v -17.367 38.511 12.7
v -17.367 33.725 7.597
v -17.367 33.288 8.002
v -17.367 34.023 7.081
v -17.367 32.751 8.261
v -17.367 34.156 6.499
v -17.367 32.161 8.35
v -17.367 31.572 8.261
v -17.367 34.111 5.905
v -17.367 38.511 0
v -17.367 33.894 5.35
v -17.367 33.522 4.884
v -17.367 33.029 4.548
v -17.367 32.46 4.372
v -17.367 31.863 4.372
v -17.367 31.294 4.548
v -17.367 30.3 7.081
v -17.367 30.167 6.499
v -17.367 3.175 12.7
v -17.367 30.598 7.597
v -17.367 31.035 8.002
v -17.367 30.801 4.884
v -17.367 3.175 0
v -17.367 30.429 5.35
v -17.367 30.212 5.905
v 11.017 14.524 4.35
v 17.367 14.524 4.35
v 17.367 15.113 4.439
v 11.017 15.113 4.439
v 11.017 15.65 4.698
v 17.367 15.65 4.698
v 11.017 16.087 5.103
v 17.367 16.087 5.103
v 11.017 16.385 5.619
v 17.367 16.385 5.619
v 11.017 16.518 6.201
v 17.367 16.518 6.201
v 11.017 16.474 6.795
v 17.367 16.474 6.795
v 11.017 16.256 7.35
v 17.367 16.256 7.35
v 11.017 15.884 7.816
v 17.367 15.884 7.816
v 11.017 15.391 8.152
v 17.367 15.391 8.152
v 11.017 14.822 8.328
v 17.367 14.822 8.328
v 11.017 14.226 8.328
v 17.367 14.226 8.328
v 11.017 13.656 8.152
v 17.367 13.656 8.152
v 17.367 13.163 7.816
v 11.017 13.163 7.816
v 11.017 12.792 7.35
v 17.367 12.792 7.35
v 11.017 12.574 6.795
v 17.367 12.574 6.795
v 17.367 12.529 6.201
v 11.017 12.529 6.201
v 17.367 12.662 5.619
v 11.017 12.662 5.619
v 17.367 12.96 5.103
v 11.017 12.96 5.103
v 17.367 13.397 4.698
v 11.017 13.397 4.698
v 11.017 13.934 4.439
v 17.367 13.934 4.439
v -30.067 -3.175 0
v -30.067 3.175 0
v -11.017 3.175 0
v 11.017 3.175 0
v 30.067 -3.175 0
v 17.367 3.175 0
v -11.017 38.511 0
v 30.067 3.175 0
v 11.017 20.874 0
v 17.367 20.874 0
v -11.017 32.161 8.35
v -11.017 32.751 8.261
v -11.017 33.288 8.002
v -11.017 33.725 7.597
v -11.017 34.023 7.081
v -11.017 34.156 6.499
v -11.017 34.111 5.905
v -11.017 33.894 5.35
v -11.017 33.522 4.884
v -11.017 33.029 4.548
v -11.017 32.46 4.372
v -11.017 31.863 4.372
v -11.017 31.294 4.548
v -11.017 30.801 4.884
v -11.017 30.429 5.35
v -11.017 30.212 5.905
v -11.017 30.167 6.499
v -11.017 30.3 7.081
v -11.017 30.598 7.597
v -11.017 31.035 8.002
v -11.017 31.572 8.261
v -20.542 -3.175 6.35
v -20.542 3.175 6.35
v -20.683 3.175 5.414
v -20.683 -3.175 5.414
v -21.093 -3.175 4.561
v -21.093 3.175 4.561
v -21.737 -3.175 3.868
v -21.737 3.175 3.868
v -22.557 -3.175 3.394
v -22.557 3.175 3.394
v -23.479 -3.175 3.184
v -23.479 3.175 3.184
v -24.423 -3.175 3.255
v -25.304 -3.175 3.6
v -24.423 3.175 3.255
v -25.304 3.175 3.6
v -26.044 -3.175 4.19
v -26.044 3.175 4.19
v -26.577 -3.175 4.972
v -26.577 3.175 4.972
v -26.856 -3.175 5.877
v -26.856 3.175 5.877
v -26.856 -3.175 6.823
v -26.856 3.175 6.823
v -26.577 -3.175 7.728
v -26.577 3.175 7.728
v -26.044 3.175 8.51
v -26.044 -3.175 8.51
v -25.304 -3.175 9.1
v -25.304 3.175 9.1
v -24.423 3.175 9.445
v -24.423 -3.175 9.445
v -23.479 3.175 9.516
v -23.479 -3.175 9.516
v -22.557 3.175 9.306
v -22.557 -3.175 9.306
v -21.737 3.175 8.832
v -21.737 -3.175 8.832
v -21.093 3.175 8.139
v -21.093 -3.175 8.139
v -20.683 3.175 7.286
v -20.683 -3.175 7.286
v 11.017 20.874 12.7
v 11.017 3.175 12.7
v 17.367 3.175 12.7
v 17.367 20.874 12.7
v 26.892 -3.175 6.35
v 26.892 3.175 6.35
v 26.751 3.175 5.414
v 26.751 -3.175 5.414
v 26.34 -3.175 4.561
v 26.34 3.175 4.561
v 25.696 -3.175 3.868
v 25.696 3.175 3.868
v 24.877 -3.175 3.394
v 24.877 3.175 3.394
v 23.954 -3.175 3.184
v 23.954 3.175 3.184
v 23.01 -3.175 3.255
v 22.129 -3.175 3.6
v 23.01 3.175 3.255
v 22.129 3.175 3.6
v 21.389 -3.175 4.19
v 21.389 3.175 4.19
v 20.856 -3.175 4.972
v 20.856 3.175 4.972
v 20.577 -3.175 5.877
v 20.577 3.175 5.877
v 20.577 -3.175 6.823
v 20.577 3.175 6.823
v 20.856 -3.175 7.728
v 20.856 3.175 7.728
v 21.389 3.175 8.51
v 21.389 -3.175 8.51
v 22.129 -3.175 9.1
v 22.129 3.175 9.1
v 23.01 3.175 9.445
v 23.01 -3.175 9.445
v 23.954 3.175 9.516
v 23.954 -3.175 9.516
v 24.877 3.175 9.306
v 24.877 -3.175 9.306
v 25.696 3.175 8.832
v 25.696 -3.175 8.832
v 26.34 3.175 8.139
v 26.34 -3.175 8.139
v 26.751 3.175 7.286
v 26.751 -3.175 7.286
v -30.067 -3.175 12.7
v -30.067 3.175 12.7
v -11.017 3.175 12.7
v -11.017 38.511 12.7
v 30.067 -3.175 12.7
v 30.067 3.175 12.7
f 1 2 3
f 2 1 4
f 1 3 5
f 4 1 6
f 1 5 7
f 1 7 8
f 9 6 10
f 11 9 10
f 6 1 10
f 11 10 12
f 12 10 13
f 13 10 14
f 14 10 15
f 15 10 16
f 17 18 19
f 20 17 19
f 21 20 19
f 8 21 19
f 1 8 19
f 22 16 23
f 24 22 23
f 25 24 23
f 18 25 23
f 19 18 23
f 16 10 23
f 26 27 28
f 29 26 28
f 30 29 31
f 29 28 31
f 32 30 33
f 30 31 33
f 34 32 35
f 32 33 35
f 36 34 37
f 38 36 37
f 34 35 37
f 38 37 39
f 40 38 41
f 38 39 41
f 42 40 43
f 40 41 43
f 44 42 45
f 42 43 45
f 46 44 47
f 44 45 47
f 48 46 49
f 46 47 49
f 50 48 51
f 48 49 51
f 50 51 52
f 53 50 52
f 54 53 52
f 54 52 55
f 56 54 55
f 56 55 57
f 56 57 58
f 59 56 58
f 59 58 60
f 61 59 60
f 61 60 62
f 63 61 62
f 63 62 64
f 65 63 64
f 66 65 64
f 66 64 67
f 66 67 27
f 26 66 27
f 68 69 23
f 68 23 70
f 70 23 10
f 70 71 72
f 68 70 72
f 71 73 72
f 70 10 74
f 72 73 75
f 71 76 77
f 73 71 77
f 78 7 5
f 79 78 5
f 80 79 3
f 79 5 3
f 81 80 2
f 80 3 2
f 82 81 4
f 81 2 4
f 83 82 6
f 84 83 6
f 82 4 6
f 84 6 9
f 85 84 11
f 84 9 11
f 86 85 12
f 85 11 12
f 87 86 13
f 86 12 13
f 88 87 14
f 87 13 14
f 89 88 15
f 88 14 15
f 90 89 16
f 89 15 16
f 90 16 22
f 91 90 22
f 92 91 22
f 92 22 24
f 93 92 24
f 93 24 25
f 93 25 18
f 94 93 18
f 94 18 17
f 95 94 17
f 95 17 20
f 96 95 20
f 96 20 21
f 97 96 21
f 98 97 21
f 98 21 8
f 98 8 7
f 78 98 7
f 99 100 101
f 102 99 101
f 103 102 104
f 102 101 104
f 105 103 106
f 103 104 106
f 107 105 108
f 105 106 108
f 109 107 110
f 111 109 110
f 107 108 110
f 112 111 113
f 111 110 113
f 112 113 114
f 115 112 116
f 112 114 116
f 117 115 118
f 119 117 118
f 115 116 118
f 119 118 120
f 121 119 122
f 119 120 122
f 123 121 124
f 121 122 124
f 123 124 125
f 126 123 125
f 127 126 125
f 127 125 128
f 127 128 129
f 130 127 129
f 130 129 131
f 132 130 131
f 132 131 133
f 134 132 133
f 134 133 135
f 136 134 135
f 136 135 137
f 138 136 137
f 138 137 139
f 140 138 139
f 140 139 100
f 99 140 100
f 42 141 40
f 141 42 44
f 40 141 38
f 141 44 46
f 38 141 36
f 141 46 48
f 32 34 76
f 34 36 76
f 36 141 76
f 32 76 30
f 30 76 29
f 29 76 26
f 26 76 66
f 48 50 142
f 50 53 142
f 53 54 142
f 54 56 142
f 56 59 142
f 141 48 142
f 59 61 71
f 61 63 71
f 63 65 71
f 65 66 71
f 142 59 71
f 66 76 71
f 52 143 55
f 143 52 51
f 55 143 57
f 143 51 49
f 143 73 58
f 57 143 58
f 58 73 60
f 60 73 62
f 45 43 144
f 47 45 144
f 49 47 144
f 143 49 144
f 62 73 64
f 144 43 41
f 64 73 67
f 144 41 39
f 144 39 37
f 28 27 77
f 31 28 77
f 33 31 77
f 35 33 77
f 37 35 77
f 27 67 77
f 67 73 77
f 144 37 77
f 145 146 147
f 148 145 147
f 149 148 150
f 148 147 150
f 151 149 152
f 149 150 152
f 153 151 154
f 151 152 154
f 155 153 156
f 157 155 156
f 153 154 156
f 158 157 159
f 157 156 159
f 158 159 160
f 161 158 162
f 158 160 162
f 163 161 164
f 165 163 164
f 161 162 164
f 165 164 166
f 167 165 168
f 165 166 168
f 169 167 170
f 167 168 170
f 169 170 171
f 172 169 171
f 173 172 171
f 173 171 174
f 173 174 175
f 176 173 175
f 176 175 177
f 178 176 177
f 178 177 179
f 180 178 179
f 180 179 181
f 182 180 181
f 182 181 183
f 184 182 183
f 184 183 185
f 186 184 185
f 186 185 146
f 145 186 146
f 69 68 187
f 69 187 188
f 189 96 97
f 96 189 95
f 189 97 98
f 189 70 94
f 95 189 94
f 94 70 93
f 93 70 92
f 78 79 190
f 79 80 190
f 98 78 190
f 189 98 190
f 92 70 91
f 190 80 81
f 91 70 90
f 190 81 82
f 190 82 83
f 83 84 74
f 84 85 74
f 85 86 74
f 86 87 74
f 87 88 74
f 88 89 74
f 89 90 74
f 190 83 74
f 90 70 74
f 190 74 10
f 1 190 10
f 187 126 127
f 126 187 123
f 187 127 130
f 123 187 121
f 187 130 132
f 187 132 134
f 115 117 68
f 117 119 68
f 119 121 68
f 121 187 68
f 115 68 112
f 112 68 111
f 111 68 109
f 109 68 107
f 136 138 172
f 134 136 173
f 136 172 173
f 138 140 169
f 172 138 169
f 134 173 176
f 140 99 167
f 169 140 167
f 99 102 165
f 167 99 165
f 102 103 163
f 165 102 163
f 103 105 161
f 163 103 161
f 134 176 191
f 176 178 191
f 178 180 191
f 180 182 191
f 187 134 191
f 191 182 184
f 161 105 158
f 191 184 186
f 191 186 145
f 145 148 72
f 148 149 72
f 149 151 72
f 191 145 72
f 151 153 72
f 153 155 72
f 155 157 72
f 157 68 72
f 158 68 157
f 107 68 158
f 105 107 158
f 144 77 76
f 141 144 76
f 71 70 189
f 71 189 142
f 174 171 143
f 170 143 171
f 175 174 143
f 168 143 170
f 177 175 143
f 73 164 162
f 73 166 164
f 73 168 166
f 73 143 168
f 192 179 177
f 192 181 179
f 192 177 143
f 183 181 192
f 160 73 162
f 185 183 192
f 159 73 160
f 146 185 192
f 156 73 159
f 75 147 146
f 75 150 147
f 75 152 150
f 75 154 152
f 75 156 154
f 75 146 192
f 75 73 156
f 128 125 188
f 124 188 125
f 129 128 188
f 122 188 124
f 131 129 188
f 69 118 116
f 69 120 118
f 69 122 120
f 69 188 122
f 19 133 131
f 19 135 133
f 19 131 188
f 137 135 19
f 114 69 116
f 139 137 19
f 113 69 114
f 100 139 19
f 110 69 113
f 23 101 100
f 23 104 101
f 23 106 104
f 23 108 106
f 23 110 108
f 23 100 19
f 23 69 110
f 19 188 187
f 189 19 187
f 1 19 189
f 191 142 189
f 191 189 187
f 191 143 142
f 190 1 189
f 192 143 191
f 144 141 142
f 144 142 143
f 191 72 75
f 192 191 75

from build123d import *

# Parameters (mm, degrees)
SKETCH1_W           = 22.033357
SKETCH1_H           = 6.35
SKETCH1_W_2         = 12.7
BOSS_EXTRUDE1_DEPTH = 12.7
CUT_EXTRUDE1_REACH  = 49.433
SKETCH2_R           = 2
CUT_EXTRUDE2_REACH  = 8.35
SKETCH3_R           = 3.175
CUT_EXTRUDE3_REACH  = 49.433
SKETCH4_R           = 2


with BuildPart() as part:
    # Sketch1 → Boss-Extrude1 (new body)
    with BuildSketch(Plane.XY):
        Rectangle(SKETCH1_W, SKETCH1_H)
        Polygon((-11.0166785, -3.175), (-11.0166785, 3.175), (-11.0166785, 38.51148), (-17.3666785, 38.51148), (-17.3666785, 3.175), (-17.3666785, -3.175), align=None)
        Polygon((11.0166785, 20.87372), (11.0166785, 3.175), (11.0166785, -3.175), (17.3666785, -3.175), (17.3666785, 3.175), (17.3666785, 20.87372), align=None)
        with Locations((-23.7166785, 0)):
            Rectangle(SKETCH1_W_2, SKETCH1_H)
        with Locations((23.7166785, 0)):
            Rectangle(SKETCH1_W_2, SKETCH1_H)
    extrude(amount=BOSS_EXTRUDE1_DEPTH)

    # Sketch2 → Cut-Extrude1 (cut, up to next)
    with BuildSketch(Plane(origin=(17.3666785, 0, 0), x_dir=(0, 0, -1), z_dir=(1, 0, 0)), mode=Mode.PRIVATE) as cut_extrude1_sk1:
        with Locations((-6.35, 14.52372)):
            Circle(SKETCH2_R)
    cut_extrude1_tool1 = extrude(cut_extrude1_sk1.sketch, amount=-CUT_EXTRUDE1_REACH, mode=Mode.PRIVATE) & part.part
    add(cut_extrude1_tool1.solids().sort_by_distance((17.366678, 14.52372, 6.35))[0], mode=Mode.SUBTRACT)

    # Sketch3 → Cut-Extrude2 (cut, up to next)
    with BuildSketch(Plane(origin=(0, 3.175, 0), x_dir=(1, 0, 0), z_dir=(0, 1, 0)), mode=Mode.PRIVATE) as cut_extrude2_sk1:
        with Locations((-23.7166785, -6.35)):
            Circle(SKETCH3_R)
    cut_extrude2_tool1 = extrude(cut_extrude2_sk1.sketch, amount=-CUT_EXTRUDE2_REACH, mode=Mode.PRIVATE) & part.part
    add(cut_extrude2_tool1.solids().sort_by_distance((-23.716678, 3.175, 6.35))[0], mode=Mode.SUBTRACT)
    # Sketch3 → Cut-Extrude2 (cut, up to next)
    with BuildSketch(Plane(origin=(0, 3.175, 0), x_dir=(1, 0, 0), z_dir=(0, 1, 0)), mode=Mode.PRIVATE) as cut_extrude2_sk2:
        with Locations((23.7166785, -6.35)):
            Circle(SKETCH3_R)
    cut_extrude2_tool2 = extrude(cut_extrude2_sk2.sketch, amount=-CUT_EXTRUDE2_REACH, mode=Mode.PRIVATE) & part.part
    add(cut_extrude2_tool2.solids().sort_by_distance((23.716679, 3.175, 6.35))[0], mode=Mode.SUBTRACT)

    # Sketch4 → Cut-Extrude3 (cut, up to next)
    with BuildSketch(Plane.ZY.offset(17.3666785), mode=Mode.PRIVATE) as cut_extrude3_sk1:
        with Locations((6.35, 32.16148)):
            Circle(SKETCH4_R)
    cut_extrude3_tool1 = extrude(cut_extrude3_sk1.sketch, amount=-CUT_EXTRUDE3_REACH, mode=Mode.PRIVATE) & part.part
    add(cut_extrude3_tool1.solids().sort_by_distance((-17.366678, 32.16148, 6.35))[0], mode=Mode.SUBTRACT)


solid = part.part
